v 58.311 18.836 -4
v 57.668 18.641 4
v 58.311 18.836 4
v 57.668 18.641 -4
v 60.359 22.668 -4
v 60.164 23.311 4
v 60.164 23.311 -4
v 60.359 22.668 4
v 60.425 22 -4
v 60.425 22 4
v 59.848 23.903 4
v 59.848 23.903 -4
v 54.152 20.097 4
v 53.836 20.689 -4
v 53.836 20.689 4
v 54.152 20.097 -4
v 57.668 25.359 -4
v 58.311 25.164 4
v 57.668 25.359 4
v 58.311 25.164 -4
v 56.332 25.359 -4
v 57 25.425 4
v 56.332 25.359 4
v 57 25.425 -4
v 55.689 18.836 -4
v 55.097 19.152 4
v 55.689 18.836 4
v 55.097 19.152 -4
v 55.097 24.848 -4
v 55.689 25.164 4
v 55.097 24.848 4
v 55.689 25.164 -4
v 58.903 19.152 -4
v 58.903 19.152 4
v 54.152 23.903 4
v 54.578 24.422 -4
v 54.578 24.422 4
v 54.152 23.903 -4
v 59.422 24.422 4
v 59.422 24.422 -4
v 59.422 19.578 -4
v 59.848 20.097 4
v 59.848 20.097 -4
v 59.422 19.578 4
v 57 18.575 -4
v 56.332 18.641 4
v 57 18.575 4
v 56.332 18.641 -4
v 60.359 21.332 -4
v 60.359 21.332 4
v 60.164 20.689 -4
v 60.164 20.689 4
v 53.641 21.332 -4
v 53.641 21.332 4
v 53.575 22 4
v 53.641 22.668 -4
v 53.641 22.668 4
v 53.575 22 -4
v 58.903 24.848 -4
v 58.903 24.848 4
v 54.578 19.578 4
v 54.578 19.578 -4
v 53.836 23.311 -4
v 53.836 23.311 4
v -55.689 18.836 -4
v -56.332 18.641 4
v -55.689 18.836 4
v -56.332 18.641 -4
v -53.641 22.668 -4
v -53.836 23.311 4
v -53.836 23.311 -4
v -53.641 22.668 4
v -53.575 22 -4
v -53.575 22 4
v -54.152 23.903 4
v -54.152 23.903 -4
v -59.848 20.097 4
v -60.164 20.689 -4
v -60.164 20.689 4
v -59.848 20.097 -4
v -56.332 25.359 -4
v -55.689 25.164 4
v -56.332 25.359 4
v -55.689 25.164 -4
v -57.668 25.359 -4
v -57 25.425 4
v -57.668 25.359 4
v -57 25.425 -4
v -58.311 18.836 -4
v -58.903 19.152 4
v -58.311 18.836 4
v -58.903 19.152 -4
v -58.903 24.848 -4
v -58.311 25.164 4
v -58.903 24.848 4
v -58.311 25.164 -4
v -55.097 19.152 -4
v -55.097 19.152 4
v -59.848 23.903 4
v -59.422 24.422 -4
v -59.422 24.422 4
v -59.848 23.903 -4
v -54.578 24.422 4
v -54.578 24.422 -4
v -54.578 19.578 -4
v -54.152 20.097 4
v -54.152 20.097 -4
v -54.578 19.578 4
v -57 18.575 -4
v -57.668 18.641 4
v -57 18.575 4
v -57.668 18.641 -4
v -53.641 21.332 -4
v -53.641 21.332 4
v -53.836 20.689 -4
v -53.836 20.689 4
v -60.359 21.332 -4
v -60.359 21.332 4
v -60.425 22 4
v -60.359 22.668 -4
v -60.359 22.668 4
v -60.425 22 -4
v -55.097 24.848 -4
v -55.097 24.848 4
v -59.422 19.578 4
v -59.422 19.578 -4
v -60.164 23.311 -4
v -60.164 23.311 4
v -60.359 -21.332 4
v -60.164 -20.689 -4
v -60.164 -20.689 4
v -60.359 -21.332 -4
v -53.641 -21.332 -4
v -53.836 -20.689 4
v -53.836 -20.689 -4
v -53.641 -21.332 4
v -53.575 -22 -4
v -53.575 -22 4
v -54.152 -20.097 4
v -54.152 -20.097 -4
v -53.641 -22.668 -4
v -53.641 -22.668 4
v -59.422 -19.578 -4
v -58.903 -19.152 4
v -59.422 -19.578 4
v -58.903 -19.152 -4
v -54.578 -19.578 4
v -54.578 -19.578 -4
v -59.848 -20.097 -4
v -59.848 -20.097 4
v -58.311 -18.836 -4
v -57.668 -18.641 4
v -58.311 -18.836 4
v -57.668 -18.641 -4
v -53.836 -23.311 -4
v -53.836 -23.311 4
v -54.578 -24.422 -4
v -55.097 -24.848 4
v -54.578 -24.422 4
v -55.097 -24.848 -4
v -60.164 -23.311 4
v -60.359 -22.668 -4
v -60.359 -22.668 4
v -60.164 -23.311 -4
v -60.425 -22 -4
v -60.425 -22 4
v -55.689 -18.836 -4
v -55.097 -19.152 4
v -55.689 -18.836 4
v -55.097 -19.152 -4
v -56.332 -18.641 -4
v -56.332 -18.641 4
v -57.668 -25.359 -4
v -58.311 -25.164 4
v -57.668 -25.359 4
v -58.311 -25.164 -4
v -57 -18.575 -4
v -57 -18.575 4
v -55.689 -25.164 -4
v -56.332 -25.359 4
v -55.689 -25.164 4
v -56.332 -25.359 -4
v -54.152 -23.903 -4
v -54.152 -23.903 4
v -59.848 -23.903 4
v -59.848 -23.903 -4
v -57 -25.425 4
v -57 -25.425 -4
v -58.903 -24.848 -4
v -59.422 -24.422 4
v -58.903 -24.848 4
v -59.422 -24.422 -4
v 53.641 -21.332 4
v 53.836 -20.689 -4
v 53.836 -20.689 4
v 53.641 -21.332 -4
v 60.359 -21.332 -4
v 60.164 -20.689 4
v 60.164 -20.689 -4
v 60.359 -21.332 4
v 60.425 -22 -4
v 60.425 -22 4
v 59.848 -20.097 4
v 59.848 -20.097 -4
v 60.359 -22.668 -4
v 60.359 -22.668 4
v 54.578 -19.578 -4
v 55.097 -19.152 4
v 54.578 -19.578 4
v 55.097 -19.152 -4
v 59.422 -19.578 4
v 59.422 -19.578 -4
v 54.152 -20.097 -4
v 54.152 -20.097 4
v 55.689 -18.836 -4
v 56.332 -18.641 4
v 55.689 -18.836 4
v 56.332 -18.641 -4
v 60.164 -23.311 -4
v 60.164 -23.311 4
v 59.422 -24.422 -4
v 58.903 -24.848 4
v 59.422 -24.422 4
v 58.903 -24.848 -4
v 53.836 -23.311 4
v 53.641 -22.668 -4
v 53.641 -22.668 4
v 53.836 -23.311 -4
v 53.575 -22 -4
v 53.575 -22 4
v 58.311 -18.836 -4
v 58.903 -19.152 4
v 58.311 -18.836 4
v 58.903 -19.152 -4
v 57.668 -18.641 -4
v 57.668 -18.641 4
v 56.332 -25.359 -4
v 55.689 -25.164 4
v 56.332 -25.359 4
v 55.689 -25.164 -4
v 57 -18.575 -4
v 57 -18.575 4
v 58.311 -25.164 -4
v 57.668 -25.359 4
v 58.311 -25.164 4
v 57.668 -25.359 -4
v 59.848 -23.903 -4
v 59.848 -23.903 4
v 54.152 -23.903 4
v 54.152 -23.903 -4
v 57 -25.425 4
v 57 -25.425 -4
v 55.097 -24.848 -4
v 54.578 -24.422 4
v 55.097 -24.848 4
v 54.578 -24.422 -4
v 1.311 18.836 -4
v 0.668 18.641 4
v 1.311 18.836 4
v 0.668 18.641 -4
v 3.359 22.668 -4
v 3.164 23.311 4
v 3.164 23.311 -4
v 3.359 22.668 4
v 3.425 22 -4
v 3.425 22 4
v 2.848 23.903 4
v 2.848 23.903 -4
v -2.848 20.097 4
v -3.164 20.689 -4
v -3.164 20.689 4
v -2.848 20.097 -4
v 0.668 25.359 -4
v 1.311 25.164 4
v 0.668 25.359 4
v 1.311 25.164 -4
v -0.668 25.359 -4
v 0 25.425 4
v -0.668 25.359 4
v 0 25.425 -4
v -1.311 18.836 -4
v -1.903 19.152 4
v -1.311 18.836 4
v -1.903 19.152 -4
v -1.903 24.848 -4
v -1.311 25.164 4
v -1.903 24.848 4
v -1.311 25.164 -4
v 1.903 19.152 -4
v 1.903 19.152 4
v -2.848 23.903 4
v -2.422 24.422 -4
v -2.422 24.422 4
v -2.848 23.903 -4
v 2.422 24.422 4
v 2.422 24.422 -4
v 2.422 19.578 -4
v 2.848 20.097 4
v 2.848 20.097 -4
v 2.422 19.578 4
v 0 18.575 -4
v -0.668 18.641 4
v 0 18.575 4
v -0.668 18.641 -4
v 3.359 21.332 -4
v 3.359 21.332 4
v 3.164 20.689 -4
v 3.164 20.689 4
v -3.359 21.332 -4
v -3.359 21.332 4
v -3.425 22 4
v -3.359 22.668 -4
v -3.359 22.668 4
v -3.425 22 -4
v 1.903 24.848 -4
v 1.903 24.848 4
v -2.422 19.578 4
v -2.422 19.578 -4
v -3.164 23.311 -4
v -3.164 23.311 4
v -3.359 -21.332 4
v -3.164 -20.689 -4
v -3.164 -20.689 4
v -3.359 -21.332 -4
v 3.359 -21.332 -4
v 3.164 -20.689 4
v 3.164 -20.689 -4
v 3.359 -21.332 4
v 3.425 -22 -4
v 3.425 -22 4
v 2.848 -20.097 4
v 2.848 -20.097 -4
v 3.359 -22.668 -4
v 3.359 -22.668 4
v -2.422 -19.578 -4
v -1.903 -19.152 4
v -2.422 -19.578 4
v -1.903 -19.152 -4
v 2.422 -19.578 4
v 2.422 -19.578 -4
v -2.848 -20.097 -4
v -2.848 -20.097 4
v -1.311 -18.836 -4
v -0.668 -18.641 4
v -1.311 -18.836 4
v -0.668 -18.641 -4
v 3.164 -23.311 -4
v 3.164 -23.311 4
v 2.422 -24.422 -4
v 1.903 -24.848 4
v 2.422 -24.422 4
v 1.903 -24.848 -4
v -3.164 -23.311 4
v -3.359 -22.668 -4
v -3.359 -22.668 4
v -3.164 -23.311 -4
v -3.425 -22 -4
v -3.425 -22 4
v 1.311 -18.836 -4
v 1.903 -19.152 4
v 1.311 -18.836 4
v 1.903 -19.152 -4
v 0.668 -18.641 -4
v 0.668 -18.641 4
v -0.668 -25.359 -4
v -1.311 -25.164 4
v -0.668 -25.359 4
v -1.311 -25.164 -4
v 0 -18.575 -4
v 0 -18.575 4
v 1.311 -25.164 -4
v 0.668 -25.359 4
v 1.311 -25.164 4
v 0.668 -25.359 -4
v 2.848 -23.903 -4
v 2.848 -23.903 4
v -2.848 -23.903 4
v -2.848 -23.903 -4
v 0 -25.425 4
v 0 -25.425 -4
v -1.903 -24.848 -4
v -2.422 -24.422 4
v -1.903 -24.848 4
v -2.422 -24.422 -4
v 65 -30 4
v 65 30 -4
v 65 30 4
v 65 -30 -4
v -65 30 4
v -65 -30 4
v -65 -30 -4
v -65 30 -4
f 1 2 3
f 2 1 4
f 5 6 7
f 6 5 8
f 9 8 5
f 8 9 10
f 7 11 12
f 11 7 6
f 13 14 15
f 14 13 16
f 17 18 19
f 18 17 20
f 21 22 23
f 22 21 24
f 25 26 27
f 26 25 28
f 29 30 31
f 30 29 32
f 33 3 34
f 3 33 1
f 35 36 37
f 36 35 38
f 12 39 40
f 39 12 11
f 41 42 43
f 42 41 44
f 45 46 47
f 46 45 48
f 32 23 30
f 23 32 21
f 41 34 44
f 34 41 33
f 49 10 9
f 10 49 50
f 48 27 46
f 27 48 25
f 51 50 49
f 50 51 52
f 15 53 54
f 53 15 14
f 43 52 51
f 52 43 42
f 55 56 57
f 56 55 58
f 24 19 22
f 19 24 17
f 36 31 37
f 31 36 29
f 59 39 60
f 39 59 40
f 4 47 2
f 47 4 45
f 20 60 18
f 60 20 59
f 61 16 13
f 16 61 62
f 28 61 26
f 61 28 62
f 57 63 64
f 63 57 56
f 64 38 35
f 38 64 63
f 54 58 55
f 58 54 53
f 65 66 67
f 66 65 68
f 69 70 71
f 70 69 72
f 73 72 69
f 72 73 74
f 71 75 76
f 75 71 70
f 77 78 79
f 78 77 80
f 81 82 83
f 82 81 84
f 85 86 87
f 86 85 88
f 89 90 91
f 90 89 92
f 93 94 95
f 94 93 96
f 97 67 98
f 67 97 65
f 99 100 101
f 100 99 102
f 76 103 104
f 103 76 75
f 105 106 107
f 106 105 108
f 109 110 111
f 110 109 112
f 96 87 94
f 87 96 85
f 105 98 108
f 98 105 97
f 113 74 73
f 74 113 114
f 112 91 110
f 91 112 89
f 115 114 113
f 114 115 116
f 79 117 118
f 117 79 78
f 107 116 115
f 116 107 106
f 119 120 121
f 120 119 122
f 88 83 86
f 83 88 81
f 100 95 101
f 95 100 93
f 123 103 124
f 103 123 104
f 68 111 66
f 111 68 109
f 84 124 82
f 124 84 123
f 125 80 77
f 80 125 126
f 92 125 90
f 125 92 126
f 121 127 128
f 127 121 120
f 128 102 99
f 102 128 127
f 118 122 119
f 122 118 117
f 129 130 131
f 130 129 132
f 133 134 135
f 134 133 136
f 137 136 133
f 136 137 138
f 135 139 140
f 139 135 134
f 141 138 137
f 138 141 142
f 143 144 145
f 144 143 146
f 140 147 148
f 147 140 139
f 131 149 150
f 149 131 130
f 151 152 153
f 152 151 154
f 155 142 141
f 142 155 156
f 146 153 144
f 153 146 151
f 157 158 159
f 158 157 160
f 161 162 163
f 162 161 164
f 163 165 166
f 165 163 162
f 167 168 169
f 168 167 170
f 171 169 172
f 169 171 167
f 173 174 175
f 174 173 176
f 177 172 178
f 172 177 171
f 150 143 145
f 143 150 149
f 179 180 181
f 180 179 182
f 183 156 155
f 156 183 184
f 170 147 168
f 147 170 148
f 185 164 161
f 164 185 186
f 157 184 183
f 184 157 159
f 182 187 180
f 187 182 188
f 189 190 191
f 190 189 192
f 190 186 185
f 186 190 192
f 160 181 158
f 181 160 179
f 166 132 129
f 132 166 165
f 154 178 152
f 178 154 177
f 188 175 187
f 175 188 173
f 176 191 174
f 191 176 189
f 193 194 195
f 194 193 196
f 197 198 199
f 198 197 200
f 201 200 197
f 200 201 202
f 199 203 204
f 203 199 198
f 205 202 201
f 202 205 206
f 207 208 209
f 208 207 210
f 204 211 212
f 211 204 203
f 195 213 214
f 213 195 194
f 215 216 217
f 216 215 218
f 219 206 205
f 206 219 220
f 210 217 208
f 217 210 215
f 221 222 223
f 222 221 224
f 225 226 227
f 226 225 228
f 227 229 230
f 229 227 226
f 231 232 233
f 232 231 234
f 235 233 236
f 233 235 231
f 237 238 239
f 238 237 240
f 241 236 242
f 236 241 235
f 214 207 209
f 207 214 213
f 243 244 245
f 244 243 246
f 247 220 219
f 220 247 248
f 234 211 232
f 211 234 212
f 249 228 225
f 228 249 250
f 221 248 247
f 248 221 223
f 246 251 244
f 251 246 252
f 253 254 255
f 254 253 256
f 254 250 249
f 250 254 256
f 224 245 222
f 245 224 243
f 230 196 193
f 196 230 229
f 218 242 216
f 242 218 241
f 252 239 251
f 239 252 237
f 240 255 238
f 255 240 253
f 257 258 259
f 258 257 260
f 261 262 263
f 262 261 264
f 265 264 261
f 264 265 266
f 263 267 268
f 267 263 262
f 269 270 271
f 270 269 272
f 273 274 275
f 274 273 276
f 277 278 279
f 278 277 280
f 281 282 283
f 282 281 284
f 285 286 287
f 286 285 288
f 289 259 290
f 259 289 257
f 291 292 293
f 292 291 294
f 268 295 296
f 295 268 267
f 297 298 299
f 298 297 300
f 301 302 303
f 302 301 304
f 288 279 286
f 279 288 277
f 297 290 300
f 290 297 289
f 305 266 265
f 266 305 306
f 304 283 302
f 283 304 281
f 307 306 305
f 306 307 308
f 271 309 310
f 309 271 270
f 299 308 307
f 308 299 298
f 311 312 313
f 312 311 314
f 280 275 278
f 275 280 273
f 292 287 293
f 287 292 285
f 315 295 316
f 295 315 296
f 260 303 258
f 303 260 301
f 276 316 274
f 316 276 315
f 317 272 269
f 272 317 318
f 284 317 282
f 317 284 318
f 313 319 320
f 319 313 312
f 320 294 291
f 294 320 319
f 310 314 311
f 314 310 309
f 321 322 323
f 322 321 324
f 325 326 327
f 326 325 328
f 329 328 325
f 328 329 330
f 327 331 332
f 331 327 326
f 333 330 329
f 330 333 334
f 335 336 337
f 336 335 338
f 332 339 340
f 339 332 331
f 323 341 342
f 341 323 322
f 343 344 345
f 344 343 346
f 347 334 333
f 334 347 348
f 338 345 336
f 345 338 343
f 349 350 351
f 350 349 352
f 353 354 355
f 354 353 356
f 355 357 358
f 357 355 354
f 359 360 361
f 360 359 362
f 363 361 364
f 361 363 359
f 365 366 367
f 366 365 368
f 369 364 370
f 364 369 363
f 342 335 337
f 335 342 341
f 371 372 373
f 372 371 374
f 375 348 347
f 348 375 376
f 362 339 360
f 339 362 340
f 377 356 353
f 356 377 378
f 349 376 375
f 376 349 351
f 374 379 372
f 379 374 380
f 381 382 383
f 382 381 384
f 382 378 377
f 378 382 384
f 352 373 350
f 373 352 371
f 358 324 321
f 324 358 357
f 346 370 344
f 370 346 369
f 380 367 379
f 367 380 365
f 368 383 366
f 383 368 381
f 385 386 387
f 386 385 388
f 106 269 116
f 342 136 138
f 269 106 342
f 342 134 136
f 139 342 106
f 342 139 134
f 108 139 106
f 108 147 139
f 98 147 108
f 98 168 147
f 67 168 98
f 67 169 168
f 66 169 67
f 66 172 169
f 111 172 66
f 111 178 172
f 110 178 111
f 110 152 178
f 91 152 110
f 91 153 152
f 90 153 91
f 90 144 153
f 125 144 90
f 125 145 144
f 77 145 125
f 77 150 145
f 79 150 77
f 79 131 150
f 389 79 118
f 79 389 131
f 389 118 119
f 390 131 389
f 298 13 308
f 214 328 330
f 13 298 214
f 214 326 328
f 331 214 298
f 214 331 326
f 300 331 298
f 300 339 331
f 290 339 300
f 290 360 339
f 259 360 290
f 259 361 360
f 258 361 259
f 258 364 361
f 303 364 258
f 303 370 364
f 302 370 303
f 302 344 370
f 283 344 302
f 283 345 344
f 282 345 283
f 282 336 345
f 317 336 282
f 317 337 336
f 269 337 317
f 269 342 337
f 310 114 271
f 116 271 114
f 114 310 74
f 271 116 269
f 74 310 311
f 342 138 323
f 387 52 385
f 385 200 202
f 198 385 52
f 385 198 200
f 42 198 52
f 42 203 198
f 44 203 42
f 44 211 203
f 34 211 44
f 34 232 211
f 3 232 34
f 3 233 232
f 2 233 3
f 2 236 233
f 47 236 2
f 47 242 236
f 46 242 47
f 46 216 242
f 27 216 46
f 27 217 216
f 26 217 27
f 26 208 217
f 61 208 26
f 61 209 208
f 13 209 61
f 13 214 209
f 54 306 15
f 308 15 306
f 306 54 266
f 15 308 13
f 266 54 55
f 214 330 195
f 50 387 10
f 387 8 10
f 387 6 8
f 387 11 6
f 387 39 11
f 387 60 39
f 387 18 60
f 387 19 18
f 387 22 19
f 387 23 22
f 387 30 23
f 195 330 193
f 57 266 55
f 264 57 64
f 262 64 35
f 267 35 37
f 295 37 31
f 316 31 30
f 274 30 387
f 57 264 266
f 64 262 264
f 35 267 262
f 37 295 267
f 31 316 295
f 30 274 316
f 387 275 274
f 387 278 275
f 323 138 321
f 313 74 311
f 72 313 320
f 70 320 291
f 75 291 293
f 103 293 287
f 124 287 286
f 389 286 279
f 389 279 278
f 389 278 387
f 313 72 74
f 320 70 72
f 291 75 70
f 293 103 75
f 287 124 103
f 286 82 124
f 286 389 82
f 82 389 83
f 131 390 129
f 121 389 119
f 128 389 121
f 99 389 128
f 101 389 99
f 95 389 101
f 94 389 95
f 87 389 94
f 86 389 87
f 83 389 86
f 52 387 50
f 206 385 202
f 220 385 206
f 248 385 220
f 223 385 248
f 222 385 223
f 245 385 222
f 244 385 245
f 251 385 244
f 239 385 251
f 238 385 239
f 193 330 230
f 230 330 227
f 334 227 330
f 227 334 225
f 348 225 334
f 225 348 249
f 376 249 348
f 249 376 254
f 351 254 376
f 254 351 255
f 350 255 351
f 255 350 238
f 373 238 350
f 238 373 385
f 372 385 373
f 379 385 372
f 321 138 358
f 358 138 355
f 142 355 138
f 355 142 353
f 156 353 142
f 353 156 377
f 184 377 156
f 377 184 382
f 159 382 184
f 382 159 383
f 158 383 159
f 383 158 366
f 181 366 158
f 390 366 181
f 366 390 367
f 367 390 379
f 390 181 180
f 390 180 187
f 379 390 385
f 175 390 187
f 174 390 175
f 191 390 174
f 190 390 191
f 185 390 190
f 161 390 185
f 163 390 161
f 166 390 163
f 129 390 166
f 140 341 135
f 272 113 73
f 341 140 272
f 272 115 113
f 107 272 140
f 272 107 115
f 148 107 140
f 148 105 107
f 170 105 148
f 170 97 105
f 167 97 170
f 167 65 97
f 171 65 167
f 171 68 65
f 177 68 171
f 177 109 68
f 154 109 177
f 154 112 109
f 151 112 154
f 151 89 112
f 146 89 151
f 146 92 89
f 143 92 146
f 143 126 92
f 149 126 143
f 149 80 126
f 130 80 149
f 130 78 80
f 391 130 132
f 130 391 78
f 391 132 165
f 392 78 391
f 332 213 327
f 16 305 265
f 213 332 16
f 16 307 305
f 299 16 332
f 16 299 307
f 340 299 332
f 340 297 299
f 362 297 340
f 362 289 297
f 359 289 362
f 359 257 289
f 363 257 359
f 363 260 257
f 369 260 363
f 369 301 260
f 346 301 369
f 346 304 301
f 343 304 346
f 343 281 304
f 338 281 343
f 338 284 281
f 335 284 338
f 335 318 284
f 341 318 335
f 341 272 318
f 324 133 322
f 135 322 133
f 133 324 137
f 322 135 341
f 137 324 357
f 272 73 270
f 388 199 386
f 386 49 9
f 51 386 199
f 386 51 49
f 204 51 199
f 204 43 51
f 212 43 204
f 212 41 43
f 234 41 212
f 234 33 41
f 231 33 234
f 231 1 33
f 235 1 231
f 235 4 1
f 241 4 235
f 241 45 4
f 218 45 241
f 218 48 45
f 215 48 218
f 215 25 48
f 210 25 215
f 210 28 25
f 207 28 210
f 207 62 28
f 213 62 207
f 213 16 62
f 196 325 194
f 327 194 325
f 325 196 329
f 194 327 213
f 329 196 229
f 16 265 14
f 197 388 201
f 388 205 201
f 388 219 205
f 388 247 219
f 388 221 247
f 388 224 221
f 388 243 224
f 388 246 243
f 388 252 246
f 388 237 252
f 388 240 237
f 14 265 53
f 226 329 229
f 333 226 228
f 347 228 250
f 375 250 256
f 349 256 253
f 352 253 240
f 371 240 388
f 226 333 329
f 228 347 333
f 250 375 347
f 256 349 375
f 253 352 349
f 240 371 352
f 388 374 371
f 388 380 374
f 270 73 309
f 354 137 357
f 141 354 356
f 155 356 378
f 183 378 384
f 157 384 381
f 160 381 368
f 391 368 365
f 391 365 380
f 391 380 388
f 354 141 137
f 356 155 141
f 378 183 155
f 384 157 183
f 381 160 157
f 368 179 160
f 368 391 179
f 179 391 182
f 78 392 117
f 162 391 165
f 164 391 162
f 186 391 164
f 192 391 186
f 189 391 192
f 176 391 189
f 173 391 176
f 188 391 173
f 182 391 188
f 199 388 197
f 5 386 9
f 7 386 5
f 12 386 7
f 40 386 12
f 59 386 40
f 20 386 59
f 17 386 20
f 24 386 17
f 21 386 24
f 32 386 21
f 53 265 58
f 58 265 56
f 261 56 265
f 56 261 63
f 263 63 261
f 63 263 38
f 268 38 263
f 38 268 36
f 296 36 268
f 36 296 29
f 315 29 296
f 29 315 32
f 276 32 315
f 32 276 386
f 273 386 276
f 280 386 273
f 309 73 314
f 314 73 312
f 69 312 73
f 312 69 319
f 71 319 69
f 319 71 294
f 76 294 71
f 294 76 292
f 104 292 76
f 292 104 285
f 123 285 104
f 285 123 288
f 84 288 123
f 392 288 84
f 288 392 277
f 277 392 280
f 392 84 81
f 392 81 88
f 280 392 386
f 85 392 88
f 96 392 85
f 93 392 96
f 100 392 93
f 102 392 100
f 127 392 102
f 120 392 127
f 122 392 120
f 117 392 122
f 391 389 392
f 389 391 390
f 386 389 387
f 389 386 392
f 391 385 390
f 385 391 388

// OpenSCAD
$fn = 32;

// ----------------------------------------------------------------------
// Corner plate 130 x 60 x 8
// 6 holes, centres taken from the edge offset
// ----------------------------------------------------------------------

// --- parameters (mm) ---
plate = [130, 60, 8];    // overall size (x, y, z)
holes = 6;               // number of holes the drawing asks for
bore_d = 6.6;            // nominal hole diameter from the drawing
print_allowance = 0.25;  // clearance added for printing
edge = 8;                // hole centre offset from the plate edge

// --- derived feature positions (mm) ---
hole_d = bore_d + print_allowance;  // = 6.85   hole diameter as printed
corner_x = plate[0] / 2 - edge;     // = 57   corner hole X
corner_y = plate[1] / 2 - edge;     // = 22   corner hole Y
feature_centers = [
  [corner_x, corner_y],
  [-corner_x, corner_y],
  [-corner_x, -corner_y],
  [corner_x, -corner_y],
  [0, corner_y],
  [0, -corner_y]
];   // hole centres the loop below drills

// plate outline, every hole drilled through with the same cutters
difference() {
  cube(plate, center = true);
  for (centre = feature_centers)
    translate([centre[0], centre[1], 0])
      cylinder(d = hole_d, h = plate[2] + 2, center = true);
}
